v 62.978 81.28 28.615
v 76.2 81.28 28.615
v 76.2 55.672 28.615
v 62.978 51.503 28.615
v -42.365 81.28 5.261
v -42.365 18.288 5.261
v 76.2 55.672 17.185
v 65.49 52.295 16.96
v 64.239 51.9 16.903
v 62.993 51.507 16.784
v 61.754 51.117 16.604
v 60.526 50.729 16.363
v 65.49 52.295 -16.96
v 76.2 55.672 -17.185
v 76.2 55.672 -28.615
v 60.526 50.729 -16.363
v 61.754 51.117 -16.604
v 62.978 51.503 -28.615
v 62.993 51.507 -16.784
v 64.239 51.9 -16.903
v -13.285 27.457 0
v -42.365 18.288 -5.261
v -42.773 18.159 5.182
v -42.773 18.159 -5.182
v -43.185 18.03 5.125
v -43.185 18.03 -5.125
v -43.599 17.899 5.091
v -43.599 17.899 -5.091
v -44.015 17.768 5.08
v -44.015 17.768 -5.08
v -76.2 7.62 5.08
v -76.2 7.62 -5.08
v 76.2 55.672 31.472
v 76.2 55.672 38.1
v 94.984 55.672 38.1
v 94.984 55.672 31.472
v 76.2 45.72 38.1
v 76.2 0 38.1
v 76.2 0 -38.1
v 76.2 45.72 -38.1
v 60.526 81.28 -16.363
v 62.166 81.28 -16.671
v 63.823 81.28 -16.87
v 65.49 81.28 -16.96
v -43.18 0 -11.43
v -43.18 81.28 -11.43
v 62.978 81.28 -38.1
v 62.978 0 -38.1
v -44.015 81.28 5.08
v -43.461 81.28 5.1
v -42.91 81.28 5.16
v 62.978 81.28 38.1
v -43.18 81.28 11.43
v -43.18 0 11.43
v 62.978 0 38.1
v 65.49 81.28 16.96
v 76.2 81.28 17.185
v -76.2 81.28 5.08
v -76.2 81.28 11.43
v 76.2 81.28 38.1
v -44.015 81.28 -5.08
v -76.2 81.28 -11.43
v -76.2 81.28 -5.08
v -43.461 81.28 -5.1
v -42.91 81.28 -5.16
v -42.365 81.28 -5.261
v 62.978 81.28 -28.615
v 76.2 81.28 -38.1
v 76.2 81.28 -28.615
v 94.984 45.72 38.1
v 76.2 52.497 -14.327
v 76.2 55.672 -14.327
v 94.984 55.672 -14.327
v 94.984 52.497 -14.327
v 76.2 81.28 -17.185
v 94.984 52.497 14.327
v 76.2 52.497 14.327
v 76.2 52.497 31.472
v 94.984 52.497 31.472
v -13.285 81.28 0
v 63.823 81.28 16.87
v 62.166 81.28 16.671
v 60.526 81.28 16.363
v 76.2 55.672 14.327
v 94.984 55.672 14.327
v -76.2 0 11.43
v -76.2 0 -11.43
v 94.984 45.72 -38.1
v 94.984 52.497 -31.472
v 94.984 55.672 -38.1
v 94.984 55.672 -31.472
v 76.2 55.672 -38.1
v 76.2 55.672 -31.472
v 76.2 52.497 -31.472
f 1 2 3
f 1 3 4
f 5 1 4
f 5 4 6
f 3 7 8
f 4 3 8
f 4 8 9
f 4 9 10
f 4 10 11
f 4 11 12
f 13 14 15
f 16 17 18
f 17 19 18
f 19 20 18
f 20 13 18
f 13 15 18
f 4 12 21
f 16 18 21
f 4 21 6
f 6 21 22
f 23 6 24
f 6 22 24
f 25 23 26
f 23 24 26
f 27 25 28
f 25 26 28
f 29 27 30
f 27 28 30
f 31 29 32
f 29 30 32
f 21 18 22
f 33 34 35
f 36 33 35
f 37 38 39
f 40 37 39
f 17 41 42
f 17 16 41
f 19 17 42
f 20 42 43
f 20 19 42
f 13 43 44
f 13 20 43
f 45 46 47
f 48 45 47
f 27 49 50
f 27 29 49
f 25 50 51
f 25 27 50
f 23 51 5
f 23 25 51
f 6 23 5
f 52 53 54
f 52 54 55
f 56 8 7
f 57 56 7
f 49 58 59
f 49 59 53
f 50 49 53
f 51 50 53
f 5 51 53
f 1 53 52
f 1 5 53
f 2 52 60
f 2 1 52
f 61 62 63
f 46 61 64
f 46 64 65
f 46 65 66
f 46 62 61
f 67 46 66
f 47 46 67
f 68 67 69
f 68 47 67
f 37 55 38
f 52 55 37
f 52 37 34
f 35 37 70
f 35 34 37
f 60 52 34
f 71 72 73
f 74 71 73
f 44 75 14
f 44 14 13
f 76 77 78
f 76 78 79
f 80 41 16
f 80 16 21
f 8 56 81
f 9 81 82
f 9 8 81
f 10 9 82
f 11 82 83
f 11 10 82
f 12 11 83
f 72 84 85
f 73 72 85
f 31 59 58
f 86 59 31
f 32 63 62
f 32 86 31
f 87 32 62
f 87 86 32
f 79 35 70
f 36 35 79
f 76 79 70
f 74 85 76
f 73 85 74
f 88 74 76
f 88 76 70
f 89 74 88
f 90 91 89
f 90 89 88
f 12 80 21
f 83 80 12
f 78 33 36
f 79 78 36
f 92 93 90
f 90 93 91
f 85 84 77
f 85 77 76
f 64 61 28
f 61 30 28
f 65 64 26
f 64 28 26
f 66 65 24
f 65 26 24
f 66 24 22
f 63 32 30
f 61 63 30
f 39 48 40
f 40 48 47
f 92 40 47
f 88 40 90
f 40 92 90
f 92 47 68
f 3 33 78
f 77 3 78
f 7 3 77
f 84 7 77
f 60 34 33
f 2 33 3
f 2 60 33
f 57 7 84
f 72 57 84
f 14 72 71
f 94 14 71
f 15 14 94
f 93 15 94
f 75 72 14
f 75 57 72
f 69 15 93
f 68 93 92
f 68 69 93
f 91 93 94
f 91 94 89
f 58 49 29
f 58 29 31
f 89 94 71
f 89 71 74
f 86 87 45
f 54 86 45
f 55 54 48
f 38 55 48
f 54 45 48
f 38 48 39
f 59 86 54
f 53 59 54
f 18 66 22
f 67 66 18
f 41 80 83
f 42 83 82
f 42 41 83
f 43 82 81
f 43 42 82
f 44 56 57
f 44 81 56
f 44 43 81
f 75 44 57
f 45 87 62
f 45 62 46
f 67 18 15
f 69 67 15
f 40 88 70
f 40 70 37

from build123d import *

# Parameters (mm, degrees)
SKETCH1_W           = 152.4
SKETCH1_H           = 76.2
BOSS_EXTRUDE1_DEPTH = 81.28
CUT_EXTRUDE1_DEPTH  = 73.66
SKETCH4_W           = 177.8
SKETCH4_H           = 76.2
REVOLVE1_ANGLE      = 17.5
CUT_EXTRUDE2_DEPTH  = 136.575102434
SKETCH5_W           = 25.4
SKETCH5_H           = 76.2
CUT_EXTRUDE3_DEPTH  = 45.72
FILLET1_R           = 7.62
FILLET2_R           = 25.4
SKETCH7_W           = 21.387890157
SKETCH7_H           = 5.413955727
CUT_EXTRUDE5_DEPTH  = 149.031271926
SKETCH8_W           = 2.486098051
SKETCH8_H           = 76.2
CUT_EXTRUDE6_DEPTH  = 119.538217147
SKETCH9_W           = 18.783789955
SKETCH9_H           = 17.145
CUT_EXTRUDE7_DEPTH  = 3.175


with BuildPart() as part:
    # Sketch1 → Boss-Extrude1 (new body)
    with BuildSketch(Plane(origin=(0, 0, 0), x_dir=(1, 0, 0), z_dir=(0, 1, 0))):
        Rectangle(SKETCH1_W, SKETCH1_H)
    extrude(amount=BOSS_EXTRUDE1_DEPTH)

    # Sketch2 → Cut-Extrude1 (cut)
    with BuildSketch(Plane(origin=(0, 81.28, 0), x_dir=(1, 0, 0), z_dir=(0, 1, 0))):
        Polygon((-76.2, 0), (-76.2, 5.08), (-43.18, 5.08), (62.978326754, 28.614734436), (76.2, 28.614734436), (76.2, 17.184734436), (62.978326754, 16.907219588), (-13.285212414, 0), (62.978326754, -16.907219588), (76.2, -17.184734436), (76.2, -28.614734436), (62.978326754, -28.614734436), (-43.18, -5.08), (-76.2, -5.08), align=None)
    extrude(amount=-CUT_EXTRUDE1_DEPTH, mode=Mode.SUBTRACT)

    # Sketch4 → Revolve1 (revolve)
    with BuildSketch(Plane(origin=(0, 7.62, 0), x_dir=(-1, 0, 0), z_dir=(0, -1, 0))):
        with Locations((-12.7, 0)):
            Rectangle(SKETCH4_W, SKETCH4_H)
    revolve(axis=Axis((-76.2, 7.62, 38.1), (0, 0, 1)), revolution_arc=REVOLVE1_ANGLE)

    # Sketch3 → Cut-Extrude2 (cut, through all)
    with BuildSketch(Plane(origin=(0, 81.28, 0), x_dir=(1, 0, 0), z_dir=(0, 1, 0))):
        Polygon((62.978326754, 38.1), (-76.2, 38.1), (-76.2, 11.43), (-43.18, 11.43), align=None)
        Polygon((-76.2, -11.43), (-43.18, -11.43), (62.978326754, -38.1), (-76.2, -38.1), align=None)
    extrude(amount=-CUT_EXTRUDE2_DEPTH, mode=Mode.SUBTRACT)

    # Sketch5 → Cut-Extrude3 (cut)
    with BuildSketch(Plane(origin=(0, 0, 0), x_dir=(-1, 0, 0), z_dir=(0, -1, 0))):
        with Locations((-88.9, 0)):
            Rectangle(SKETCH5_W, SKETCH5_H)
    extrude(amount=-CUT_EXTRUDE3_DEPTH, mode=Mode.SUBTRACT)

    # Fillet1
    fillet1_edges = [part.edges().sort_by_distance(p)[0] for p in [
        (-43.18, 49.655583004, 5.08),
        (-43.18, 49.655583004, -5.08),
    ]]
    fillet(fillet1_edges, radius=FILLET1_R)

    # Fillet2
    fillet2_edges = [part.edges().sort_by_distance(p)[0] for p in [
        (62.978326754, 66.391378932, 16.907219588),
        (62.978326754, 66.391378932, -16.907219588),
    ]]
    fillet(fillet2_edges, radius=FILLET2_R)

    # Sketch7 → Cut-Extrude5 (cut, through all)
    with BuildSketch(Plane.XY.offset(38.1)):
        with Locations((86.893945078, 58.378513289)):
            Rectangle(SKETCH7_W, SKETCH7_H)
    extrude(amount=-CUT_EXTRUDE5_DEPTH, mode=Mode.SUBTRACT)

    # Sketch8 → Cut-Extrude6 (cut, through all)
    with BuildSketch(Plane(origin=(0, 55.671535425, 0), x_dir=(1, 0, 0), z_dir=(0, 1, 0))):
        with Locations((96.226838981, 0)):
            Rectangle(SKETCH8_W, SKETCH8_H)
    extrude(amount=-CUT_EXTRUDE6_DEPTH, mode=Mode.SUBTRACT)

    # Sketch9 → Cut-Extrude7 (cut)
    with BuildSketch(Plane(origin=(0, 55.671535425, 0), x_dir=(1, 0, 0), z_dir=(0, 1, 0))):
        with Locations((85.591894978, 22.899734436)):
            Rectangle(SKETCH9_W, SKETCH9_H)
        with Locations((85.591894978, -22.899734436)):
            Rectangle(SKETCH9_W, SKETCH9_H)
    extrude(amount=-CUT_EXTRUDE7_DEPTH, mode=Mode.SUBTRACT)


solid = part.part
